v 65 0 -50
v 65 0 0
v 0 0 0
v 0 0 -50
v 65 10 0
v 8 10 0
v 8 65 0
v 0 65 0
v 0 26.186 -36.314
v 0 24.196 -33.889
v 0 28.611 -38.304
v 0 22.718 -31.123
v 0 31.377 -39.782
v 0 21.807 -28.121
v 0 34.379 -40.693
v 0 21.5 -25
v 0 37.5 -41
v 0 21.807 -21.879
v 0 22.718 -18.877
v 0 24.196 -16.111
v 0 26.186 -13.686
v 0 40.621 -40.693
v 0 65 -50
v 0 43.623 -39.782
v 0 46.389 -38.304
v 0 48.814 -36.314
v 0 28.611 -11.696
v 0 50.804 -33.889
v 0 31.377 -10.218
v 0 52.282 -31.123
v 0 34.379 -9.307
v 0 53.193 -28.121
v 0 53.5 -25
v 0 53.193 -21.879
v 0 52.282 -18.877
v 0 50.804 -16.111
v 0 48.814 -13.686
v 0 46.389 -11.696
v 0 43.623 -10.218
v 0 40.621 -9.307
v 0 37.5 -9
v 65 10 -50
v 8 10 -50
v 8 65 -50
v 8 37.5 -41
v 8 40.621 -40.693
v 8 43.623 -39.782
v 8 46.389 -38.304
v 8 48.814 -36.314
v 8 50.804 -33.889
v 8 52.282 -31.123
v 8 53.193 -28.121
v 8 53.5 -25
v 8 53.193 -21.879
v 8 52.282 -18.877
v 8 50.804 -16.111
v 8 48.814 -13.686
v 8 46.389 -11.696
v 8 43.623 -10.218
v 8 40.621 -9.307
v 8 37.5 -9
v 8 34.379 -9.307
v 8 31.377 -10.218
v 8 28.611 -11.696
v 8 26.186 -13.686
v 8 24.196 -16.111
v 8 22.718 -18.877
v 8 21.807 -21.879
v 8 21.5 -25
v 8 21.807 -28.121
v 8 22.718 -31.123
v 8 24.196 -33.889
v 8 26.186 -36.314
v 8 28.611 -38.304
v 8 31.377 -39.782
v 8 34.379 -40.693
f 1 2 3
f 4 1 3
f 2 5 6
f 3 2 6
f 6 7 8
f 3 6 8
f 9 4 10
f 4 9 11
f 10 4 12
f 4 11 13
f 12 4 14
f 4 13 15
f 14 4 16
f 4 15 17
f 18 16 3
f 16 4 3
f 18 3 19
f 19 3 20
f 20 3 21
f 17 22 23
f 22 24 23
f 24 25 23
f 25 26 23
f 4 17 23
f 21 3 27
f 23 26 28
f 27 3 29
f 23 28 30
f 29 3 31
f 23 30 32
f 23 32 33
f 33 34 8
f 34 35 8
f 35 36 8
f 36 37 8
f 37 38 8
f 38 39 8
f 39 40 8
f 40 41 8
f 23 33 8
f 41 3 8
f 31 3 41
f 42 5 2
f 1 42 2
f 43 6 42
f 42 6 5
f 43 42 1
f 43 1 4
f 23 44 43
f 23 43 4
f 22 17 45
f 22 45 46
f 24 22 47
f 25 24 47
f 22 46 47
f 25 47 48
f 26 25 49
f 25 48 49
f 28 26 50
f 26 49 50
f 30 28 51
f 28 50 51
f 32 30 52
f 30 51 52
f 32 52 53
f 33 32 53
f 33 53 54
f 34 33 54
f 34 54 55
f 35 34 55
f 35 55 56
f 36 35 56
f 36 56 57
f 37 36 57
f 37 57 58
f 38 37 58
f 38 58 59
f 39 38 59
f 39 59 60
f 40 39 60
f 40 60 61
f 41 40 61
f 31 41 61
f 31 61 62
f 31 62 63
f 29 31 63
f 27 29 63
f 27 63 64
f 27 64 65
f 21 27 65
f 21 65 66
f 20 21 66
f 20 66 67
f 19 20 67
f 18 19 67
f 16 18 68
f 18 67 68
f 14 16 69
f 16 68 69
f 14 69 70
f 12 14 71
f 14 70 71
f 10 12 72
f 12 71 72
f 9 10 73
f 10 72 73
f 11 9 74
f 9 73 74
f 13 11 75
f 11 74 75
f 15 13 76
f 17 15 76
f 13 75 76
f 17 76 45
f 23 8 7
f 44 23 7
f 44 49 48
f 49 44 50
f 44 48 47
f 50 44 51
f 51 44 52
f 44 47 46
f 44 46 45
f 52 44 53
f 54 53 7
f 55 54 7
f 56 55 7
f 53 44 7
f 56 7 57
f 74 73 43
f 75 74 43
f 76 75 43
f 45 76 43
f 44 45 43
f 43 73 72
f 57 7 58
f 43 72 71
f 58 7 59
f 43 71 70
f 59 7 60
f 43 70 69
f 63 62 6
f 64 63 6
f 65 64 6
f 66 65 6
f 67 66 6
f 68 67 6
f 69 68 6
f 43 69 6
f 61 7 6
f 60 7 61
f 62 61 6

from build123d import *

# Parameters (mm, degrees)
AUFSATZ_LINEAR_AUSTRAGEN1_DEPTH = 50
SKIZZE2_R                       = 16
SCHNITT_LINEAR_AUSTRAGEN1_DEPTH = 50


with BuildPart() as part:
    # Skizze1 → Aufsatz-Linear austragen1 (new body)
    with BuildSketch(Plane.XY):
        Polygon((0, 65), (8, 65), (8, 10), (65, 10), (65, 0), (0, 0), align=None)
    extrude(amount=-AUFSATZ_LINEAR_AUSTRAGEN1_DEPTH)

    # Skizze2 → Schnitt-Linear austragen1 (cut)
    with BuildSketch(Plane(origin=(8, 0, 0), x_dir=(0, 0, -1), z_dir=(1, 0, 0))):
        with Locations((25, 37.5)):
            Circle(SKIZZE2_R)
    extrude(amount=-SCHNITT_LINEAR_AUSTRAGEN1_DEPTH, mode=Mode.SUBTRACT)


solid = part.part
